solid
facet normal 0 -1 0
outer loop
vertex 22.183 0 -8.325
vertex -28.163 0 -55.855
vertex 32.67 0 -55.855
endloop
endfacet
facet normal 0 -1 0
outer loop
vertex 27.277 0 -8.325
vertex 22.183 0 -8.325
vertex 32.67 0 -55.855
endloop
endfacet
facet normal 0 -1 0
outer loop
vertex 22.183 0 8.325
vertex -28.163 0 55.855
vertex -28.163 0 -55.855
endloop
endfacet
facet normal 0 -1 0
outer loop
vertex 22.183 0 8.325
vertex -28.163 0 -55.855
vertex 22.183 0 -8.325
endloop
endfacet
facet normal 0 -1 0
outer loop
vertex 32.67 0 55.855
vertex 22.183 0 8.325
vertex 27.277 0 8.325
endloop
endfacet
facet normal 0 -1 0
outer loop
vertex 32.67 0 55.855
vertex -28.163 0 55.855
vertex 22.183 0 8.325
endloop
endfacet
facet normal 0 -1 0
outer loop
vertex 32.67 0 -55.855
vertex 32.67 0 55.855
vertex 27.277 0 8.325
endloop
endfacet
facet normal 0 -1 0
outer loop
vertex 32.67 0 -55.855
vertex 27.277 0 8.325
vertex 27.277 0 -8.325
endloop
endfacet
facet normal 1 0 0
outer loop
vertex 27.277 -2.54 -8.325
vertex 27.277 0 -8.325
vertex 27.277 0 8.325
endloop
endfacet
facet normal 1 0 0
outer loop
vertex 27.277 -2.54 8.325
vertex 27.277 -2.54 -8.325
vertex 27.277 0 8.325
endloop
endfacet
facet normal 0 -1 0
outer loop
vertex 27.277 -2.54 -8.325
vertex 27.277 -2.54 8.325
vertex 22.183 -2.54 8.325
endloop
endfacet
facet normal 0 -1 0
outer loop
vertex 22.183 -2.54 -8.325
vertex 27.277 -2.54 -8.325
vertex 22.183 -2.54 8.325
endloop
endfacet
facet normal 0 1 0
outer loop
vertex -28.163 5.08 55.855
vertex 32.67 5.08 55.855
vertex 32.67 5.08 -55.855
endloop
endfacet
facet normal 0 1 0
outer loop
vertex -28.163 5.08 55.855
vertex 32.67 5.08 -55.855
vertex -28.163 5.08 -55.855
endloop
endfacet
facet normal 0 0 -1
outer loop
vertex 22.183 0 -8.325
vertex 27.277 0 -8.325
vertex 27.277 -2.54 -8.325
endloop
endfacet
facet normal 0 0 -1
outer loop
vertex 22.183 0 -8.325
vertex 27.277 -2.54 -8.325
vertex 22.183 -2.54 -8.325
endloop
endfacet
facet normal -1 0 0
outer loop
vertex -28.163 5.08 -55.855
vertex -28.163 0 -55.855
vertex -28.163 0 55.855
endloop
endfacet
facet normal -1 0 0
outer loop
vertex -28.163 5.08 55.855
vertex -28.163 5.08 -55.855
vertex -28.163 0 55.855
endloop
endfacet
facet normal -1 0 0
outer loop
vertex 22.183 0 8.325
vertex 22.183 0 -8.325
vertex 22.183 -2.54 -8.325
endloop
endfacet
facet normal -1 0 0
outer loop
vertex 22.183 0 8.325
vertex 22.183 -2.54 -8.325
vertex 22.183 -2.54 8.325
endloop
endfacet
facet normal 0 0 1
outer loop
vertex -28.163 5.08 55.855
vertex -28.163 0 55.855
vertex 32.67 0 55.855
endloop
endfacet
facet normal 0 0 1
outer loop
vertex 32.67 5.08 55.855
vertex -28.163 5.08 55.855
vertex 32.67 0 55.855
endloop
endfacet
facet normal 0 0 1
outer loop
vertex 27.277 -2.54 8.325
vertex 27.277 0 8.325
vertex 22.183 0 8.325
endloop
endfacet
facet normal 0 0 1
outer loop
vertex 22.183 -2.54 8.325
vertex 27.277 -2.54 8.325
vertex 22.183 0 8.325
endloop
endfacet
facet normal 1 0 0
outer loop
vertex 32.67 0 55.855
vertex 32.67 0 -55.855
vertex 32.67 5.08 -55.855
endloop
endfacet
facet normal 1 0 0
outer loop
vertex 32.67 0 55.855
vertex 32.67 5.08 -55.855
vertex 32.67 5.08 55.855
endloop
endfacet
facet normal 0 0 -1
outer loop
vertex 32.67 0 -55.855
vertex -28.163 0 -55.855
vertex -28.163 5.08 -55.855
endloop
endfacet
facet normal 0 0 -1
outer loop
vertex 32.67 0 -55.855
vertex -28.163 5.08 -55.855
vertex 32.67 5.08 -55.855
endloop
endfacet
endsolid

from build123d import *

# Parameters (mm, degrees)
F0_W     = 60.833
F0_H     = 111.7092
F1_DEPTH = 5.08
F2_W     = 5.094256
F2_H     = 16.649162
F3_DEPTH = 7.62


with BuildPart() as f1:
    # F0 (on Front) → F1 (new body)
    with BuildSketch(Plane.XZ):
        with Locations((2.253074, 0)):
            Rectangle(F0_W, F0_H)
    extrude(amount=-F1_DEPTH)

    # F2 (on face) → F3 (join)
    with BuildSketch(Plane(origin=(0, 5.08, 0), x_dir=(-1, 0, 0), z_dir=(0, 1, 0))):
        with Locations((-24.730271, 0)):
            Rectangle(F2_W, F2_H)
    extrude(amount=-F3_DEPTH)


solid = f1.part
